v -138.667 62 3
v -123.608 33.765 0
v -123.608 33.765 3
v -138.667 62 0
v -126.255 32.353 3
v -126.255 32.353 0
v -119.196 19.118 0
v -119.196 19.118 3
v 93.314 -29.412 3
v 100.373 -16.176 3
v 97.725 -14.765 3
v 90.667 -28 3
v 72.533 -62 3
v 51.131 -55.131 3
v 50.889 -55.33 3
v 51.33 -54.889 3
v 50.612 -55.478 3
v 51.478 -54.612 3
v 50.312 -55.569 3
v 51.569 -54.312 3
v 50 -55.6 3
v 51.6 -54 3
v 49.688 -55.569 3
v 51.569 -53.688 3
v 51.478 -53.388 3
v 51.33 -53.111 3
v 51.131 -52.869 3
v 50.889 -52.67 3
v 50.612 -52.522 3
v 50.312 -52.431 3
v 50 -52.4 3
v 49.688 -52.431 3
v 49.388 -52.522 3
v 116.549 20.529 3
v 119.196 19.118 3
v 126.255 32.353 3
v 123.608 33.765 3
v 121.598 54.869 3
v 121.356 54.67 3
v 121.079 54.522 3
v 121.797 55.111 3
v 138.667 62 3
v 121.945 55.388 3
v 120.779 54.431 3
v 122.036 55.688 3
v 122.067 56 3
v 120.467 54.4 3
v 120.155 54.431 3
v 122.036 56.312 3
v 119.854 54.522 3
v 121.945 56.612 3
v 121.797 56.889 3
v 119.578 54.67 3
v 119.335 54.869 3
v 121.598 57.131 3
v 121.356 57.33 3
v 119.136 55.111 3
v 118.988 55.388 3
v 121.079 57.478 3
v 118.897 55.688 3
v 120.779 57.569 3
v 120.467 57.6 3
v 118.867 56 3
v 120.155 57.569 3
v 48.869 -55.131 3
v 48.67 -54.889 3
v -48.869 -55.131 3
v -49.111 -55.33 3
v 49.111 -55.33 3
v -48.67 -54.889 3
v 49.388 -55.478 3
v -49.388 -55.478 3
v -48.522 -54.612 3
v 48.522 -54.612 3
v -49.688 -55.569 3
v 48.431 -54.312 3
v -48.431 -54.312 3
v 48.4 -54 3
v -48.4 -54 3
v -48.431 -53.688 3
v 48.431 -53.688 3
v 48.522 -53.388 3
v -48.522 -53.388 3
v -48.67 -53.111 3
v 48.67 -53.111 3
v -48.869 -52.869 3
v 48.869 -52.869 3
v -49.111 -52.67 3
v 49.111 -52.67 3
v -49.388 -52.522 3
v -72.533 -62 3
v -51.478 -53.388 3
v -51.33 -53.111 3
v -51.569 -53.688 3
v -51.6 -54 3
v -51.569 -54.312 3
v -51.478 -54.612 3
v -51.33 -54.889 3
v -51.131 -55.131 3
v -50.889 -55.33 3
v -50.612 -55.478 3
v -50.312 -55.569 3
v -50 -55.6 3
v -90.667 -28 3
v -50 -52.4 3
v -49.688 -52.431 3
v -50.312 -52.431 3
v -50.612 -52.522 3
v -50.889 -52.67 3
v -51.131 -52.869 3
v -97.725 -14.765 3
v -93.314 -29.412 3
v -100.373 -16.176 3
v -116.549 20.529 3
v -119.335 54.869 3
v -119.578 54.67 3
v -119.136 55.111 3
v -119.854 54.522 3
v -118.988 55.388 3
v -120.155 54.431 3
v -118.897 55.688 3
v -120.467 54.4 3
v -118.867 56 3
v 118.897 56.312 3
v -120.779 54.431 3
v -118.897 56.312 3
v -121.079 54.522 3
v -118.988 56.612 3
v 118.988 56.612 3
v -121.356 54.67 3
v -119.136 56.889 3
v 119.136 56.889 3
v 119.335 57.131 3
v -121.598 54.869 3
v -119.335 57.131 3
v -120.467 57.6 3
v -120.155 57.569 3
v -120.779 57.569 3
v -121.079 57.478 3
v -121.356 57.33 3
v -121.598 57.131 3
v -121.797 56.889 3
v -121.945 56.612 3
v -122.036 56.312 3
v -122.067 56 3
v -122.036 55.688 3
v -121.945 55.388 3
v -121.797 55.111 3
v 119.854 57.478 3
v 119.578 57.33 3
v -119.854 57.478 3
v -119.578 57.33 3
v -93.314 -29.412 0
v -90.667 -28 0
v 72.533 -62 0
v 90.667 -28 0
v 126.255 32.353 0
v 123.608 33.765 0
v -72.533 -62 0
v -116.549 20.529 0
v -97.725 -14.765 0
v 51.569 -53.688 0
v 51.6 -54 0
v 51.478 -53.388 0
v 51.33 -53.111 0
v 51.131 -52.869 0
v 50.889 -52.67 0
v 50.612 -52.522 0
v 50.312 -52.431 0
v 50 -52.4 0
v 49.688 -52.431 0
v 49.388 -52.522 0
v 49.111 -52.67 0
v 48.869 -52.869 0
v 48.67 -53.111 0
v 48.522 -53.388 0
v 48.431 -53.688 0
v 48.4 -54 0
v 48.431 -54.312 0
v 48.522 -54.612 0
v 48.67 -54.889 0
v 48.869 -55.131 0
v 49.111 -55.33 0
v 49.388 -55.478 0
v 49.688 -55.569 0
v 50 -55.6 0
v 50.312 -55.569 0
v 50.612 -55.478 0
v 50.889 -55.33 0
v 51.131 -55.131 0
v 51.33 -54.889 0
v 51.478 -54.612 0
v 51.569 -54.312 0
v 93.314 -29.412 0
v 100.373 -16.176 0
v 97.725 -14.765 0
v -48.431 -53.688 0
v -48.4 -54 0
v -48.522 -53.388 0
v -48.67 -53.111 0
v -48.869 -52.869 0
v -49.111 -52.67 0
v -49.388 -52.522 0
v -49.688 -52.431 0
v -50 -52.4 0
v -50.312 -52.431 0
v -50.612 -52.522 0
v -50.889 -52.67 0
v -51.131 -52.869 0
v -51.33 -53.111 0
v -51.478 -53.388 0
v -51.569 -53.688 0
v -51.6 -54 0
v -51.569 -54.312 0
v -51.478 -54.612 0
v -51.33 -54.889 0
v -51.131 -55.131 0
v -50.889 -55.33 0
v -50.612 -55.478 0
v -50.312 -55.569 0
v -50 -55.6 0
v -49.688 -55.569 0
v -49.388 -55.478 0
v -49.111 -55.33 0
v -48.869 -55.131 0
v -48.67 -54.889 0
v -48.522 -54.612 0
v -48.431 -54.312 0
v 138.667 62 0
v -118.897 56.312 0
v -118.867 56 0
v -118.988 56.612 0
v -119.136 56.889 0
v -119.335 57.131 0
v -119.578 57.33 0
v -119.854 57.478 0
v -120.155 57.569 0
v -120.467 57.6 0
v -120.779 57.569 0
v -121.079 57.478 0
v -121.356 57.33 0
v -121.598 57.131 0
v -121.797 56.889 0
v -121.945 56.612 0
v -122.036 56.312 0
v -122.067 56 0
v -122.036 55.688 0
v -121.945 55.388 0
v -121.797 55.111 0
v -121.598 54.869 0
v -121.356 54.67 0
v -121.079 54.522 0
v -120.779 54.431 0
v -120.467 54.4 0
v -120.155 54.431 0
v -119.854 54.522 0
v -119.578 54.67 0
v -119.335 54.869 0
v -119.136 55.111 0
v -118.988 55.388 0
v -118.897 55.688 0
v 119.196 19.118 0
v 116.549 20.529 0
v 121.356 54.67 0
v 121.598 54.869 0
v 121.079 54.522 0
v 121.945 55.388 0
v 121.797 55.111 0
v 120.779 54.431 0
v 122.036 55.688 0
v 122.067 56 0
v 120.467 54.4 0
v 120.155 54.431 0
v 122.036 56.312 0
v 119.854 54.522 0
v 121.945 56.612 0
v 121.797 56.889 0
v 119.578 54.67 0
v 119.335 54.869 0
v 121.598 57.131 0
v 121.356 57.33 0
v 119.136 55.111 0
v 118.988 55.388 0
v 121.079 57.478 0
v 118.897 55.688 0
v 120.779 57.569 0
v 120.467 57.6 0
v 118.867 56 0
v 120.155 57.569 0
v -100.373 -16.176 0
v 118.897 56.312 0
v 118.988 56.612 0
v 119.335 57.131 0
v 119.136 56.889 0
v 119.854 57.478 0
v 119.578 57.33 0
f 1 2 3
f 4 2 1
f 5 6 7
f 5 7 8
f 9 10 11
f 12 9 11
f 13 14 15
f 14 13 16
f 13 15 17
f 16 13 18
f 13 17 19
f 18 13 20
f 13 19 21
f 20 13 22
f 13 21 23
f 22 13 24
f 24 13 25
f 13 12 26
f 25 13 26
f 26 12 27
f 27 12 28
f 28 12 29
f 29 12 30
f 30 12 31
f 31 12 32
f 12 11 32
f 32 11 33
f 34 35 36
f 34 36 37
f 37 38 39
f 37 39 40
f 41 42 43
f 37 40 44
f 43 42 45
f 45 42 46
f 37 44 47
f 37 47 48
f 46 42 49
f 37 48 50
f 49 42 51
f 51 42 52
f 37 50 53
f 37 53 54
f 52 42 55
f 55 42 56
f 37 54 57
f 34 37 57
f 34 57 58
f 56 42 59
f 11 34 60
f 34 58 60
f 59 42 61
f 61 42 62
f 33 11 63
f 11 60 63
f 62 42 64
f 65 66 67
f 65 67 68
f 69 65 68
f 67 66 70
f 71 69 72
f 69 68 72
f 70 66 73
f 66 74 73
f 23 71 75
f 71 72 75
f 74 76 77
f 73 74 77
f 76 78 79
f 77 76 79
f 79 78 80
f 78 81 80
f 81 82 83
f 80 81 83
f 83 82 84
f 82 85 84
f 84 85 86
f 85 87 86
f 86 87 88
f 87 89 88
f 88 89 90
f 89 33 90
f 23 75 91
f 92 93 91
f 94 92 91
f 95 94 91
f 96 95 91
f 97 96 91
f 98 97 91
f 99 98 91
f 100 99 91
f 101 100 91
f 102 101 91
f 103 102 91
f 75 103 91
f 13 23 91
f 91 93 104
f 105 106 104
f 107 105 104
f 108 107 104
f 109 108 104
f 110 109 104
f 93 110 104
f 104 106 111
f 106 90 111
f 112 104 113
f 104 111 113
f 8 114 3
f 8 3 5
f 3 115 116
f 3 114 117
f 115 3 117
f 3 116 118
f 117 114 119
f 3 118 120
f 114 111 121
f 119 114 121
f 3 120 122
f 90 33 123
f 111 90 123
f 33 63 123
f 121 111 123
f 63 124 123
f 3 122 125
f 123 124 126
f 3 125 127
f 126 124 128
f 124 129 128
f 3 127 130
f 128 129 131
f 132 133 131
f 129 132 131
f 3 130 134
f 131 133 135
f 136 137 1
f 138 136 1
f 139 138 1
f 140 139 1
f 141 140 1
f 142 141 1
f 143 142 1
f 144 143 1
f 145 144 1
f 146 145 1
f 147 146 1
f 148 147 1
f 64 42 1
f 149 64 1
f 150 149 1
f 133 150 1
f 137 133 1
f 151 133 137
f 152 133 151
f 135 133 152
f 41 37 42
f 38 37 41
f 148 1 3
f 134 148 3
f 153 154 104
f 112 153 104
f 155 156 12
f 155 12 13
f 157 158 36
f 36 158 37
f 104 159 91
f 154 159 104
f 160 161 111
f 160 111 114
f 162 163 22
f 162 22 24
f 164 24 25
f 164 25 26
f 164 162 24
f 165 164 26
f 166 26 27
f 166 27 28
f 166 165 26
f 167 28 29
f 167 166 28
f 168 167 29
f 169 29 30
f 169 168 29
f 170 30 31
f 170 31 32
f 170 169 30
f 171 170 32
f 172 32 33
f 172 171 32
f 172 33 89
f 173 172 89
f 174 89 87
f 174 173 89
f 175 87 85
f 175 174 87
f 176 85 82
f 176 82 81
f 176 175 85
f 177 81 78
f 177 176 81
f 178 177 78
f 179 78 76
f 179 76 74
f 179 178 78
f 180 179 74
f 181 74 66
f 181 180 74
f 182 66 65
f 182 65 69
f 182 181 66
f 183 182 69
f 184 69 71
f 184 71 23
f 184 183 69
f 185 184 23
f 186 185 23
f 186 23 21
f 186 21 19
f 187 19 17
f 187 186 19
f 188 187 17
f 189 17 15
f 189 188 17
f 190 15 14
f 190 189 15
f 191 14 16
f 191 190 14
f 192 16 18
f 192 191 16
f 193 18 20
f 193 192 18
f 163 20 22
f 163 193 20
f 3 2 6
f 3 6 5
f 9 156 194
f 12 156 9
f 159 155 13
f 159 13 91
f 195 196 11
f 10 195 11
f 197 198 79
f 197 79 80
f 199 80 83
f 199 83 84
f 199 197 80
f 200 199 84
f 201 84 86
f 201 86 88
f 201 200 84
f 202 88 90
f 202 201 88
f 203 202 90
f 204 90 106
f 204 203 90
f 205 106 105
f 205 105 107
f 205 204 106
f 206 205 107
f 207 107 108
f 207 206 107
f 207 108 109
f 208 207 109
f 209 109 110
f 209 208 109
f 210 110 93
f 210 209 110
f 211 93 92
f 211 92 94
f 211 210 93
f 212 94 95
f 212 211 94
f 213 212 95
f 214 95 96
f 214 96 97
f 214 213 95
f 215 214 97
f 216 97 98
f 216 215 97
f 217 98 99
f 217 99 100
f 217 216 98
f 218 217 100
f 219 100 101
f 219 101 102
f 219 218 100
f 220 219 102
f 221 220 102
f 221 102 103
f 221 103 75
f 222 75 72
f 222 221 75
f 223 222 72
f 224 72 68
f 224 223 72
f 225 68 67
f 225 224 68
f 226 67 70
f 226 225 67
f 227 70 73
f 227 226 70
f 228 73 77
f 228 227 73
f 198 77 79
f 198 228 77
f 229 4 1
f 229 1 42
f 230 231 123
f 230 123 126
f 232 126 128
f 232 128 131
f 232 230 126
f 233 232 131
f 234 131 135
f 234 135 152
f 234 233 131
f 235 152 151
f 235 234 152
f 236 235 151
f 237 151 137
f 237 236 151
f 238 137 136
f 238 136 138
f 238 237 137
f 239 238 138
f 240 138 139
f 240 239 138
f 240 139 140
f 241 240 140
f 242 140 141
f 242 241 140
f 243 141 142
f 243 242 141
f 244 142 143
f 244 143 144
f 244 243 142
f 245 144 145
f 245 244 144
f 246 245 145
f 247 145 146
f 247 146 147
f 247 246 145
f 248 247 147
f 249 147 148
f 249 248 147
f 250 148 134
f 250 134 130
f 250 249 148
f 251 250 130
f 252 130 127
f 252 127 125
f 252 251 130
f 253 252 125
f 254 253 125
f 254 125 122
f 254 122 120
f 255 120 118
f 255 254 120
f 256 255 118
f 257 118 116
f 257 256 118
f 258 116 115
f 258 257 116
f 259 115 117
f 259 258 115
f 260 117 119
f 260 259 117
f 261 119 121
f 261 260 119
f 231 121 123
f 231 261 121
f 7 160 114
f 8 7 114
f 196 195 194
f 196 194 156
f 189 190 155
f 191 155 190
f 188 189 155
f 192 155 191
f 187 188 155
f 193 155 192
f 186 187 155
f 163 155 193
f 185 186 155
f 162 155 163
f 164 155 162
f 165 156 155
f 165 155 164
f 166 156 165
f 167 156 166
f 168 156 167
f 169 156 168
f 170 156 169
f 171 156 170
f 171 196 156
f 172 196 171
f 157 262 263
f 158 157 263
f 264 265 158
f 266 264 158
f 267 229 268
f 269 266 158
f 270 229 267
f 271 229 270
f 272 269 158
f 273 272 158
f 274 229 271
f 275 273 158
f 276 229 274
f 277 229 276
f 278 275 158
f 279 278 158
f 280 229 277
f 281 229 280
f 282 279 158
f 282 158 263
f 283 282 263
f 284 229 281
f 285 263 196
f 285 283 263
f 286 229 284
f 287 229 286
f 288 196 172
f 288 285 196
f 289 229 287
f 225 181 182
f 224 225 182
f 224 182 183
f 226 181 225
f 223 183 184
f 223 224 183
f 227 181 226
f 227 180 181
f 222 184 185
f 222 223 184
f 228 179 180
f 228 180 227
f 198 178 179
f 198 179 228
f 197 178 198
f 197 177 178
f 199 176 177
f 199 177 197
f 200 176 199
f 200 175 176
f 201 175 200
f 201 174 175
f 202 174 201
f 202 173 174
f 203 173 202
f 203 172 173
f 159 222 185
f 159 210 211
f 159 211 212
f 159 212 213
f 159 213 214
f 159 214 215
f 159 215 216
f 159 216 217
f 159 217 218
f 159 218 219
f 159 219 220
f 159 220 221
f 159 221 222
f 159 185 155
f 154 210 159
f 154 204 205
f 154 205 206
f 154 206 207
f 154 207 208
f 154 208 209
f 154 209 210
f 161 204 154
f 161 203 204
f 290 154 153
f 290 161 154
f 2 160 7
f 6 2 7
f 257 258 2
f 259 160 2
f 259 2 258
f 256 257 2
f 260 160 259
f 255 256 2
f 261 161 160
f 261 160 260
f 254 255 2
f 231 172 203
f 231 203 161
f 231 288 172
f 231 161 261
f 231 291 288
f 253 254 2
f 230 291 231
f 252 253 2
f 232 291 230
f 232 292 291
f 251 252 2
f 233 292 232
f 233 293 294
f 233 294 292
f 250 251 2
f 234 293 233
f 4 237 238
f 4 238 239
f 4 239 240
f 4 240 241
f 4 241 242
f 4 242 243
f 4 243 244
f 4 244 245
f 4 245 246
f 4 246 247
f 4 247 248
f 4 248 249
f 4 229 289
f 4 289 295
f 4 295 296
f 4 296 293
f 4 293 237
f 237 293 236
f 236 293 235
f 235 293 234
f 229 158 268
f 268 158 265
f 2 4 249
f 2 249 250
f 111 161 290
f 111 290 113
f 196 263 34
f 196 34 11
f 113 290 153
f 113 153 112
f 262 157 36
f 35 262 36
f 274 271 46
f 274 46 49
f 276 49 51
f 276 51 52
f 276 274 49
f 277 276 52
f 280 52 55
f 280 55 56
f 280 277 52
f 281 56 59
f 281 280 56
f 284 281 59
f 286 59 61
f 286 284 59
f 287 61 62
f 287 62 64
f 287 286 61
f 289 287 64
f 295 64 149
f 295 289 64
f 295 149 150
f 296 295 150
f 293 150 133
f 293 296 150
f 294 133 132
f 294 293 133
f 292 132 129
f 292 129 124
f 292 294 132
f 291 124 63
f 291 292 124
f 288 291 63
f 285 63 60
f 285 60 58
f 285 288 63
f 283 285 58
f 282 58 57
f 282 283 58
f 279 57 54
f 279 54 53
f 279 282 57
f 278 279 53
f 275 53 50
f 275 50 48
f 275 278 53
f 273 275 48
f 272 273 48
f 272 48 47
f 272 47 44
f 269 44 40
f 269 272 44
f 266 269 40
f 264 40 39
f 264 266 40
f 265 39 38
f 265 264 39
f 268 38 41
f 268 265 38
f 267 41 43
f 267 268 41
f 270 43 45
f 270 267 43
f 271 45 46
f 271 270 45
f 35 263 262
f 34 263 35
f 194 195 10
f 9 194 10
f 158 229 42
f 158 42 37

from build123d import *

# Parameters (mm, degrees)
SKETCH_1_R      = 1.6
EXTRUDE_1_DEPTH = 3
SKETCH_2_W      = 3
SKETCH_2_H      = 15
EXTRUDE_2_DEPTH = 3


with BuildPart() as part:
    # 草图1 → 凸台-拉伸1 (new body)
    with BuildSketch(Plane.XY):
        Polygon((-138.666666667, 62), (138.666666667, 62), (72.533333333, -62), (-72.533333333, -62), align=None)
        with Locations((-50, -54)):
            Circle(SKETCH_1_R, mode=Mode.SUBTRACT)
        with Locations((50, -54)):
            Circle(SKETCH_1_R, mode=Mode.SUBTRACT)
        with Locations((-120.466666667, 56)):
            Circle(SKETCH_1_R, mode=Mode.SUBTRACT)
        with Locations((120.466666667, 56)):
            Circle(SKETCH_1_R, mode=Mode.SUBTRACT)
    extrude(amount=EXTRUDE_1_DEPTH)

    # 草图2 → 凸台-拉伸2 (add)
    with BuildSketch(Plane(origin=(-82.214532872, -43.847750865, 0), x_dir=(0, 0, 1), z_dir=(-0.8823529411764701, -0.4705882352941186, 0))):
        with Locations((1.5, 80.460784314)):
            Rectangle(SKETCH_2_W, SKETCH_2_H)
        with Locations((1.5, 25.460784314)):
            Rectangle(SKETCH_2_W, SKETCH_2_H)
    extrude_2 = extrude(amount=EXTRUDE_2_DEPTH)

    # 镜向1: 凸台-拉伸2 across plane
    add(extrude_2.mirror(Plane(origin=(0, 0, 0), x_dir=(0, 0, 1), z_dir=(1, 0, 0))))


solid = part.part
